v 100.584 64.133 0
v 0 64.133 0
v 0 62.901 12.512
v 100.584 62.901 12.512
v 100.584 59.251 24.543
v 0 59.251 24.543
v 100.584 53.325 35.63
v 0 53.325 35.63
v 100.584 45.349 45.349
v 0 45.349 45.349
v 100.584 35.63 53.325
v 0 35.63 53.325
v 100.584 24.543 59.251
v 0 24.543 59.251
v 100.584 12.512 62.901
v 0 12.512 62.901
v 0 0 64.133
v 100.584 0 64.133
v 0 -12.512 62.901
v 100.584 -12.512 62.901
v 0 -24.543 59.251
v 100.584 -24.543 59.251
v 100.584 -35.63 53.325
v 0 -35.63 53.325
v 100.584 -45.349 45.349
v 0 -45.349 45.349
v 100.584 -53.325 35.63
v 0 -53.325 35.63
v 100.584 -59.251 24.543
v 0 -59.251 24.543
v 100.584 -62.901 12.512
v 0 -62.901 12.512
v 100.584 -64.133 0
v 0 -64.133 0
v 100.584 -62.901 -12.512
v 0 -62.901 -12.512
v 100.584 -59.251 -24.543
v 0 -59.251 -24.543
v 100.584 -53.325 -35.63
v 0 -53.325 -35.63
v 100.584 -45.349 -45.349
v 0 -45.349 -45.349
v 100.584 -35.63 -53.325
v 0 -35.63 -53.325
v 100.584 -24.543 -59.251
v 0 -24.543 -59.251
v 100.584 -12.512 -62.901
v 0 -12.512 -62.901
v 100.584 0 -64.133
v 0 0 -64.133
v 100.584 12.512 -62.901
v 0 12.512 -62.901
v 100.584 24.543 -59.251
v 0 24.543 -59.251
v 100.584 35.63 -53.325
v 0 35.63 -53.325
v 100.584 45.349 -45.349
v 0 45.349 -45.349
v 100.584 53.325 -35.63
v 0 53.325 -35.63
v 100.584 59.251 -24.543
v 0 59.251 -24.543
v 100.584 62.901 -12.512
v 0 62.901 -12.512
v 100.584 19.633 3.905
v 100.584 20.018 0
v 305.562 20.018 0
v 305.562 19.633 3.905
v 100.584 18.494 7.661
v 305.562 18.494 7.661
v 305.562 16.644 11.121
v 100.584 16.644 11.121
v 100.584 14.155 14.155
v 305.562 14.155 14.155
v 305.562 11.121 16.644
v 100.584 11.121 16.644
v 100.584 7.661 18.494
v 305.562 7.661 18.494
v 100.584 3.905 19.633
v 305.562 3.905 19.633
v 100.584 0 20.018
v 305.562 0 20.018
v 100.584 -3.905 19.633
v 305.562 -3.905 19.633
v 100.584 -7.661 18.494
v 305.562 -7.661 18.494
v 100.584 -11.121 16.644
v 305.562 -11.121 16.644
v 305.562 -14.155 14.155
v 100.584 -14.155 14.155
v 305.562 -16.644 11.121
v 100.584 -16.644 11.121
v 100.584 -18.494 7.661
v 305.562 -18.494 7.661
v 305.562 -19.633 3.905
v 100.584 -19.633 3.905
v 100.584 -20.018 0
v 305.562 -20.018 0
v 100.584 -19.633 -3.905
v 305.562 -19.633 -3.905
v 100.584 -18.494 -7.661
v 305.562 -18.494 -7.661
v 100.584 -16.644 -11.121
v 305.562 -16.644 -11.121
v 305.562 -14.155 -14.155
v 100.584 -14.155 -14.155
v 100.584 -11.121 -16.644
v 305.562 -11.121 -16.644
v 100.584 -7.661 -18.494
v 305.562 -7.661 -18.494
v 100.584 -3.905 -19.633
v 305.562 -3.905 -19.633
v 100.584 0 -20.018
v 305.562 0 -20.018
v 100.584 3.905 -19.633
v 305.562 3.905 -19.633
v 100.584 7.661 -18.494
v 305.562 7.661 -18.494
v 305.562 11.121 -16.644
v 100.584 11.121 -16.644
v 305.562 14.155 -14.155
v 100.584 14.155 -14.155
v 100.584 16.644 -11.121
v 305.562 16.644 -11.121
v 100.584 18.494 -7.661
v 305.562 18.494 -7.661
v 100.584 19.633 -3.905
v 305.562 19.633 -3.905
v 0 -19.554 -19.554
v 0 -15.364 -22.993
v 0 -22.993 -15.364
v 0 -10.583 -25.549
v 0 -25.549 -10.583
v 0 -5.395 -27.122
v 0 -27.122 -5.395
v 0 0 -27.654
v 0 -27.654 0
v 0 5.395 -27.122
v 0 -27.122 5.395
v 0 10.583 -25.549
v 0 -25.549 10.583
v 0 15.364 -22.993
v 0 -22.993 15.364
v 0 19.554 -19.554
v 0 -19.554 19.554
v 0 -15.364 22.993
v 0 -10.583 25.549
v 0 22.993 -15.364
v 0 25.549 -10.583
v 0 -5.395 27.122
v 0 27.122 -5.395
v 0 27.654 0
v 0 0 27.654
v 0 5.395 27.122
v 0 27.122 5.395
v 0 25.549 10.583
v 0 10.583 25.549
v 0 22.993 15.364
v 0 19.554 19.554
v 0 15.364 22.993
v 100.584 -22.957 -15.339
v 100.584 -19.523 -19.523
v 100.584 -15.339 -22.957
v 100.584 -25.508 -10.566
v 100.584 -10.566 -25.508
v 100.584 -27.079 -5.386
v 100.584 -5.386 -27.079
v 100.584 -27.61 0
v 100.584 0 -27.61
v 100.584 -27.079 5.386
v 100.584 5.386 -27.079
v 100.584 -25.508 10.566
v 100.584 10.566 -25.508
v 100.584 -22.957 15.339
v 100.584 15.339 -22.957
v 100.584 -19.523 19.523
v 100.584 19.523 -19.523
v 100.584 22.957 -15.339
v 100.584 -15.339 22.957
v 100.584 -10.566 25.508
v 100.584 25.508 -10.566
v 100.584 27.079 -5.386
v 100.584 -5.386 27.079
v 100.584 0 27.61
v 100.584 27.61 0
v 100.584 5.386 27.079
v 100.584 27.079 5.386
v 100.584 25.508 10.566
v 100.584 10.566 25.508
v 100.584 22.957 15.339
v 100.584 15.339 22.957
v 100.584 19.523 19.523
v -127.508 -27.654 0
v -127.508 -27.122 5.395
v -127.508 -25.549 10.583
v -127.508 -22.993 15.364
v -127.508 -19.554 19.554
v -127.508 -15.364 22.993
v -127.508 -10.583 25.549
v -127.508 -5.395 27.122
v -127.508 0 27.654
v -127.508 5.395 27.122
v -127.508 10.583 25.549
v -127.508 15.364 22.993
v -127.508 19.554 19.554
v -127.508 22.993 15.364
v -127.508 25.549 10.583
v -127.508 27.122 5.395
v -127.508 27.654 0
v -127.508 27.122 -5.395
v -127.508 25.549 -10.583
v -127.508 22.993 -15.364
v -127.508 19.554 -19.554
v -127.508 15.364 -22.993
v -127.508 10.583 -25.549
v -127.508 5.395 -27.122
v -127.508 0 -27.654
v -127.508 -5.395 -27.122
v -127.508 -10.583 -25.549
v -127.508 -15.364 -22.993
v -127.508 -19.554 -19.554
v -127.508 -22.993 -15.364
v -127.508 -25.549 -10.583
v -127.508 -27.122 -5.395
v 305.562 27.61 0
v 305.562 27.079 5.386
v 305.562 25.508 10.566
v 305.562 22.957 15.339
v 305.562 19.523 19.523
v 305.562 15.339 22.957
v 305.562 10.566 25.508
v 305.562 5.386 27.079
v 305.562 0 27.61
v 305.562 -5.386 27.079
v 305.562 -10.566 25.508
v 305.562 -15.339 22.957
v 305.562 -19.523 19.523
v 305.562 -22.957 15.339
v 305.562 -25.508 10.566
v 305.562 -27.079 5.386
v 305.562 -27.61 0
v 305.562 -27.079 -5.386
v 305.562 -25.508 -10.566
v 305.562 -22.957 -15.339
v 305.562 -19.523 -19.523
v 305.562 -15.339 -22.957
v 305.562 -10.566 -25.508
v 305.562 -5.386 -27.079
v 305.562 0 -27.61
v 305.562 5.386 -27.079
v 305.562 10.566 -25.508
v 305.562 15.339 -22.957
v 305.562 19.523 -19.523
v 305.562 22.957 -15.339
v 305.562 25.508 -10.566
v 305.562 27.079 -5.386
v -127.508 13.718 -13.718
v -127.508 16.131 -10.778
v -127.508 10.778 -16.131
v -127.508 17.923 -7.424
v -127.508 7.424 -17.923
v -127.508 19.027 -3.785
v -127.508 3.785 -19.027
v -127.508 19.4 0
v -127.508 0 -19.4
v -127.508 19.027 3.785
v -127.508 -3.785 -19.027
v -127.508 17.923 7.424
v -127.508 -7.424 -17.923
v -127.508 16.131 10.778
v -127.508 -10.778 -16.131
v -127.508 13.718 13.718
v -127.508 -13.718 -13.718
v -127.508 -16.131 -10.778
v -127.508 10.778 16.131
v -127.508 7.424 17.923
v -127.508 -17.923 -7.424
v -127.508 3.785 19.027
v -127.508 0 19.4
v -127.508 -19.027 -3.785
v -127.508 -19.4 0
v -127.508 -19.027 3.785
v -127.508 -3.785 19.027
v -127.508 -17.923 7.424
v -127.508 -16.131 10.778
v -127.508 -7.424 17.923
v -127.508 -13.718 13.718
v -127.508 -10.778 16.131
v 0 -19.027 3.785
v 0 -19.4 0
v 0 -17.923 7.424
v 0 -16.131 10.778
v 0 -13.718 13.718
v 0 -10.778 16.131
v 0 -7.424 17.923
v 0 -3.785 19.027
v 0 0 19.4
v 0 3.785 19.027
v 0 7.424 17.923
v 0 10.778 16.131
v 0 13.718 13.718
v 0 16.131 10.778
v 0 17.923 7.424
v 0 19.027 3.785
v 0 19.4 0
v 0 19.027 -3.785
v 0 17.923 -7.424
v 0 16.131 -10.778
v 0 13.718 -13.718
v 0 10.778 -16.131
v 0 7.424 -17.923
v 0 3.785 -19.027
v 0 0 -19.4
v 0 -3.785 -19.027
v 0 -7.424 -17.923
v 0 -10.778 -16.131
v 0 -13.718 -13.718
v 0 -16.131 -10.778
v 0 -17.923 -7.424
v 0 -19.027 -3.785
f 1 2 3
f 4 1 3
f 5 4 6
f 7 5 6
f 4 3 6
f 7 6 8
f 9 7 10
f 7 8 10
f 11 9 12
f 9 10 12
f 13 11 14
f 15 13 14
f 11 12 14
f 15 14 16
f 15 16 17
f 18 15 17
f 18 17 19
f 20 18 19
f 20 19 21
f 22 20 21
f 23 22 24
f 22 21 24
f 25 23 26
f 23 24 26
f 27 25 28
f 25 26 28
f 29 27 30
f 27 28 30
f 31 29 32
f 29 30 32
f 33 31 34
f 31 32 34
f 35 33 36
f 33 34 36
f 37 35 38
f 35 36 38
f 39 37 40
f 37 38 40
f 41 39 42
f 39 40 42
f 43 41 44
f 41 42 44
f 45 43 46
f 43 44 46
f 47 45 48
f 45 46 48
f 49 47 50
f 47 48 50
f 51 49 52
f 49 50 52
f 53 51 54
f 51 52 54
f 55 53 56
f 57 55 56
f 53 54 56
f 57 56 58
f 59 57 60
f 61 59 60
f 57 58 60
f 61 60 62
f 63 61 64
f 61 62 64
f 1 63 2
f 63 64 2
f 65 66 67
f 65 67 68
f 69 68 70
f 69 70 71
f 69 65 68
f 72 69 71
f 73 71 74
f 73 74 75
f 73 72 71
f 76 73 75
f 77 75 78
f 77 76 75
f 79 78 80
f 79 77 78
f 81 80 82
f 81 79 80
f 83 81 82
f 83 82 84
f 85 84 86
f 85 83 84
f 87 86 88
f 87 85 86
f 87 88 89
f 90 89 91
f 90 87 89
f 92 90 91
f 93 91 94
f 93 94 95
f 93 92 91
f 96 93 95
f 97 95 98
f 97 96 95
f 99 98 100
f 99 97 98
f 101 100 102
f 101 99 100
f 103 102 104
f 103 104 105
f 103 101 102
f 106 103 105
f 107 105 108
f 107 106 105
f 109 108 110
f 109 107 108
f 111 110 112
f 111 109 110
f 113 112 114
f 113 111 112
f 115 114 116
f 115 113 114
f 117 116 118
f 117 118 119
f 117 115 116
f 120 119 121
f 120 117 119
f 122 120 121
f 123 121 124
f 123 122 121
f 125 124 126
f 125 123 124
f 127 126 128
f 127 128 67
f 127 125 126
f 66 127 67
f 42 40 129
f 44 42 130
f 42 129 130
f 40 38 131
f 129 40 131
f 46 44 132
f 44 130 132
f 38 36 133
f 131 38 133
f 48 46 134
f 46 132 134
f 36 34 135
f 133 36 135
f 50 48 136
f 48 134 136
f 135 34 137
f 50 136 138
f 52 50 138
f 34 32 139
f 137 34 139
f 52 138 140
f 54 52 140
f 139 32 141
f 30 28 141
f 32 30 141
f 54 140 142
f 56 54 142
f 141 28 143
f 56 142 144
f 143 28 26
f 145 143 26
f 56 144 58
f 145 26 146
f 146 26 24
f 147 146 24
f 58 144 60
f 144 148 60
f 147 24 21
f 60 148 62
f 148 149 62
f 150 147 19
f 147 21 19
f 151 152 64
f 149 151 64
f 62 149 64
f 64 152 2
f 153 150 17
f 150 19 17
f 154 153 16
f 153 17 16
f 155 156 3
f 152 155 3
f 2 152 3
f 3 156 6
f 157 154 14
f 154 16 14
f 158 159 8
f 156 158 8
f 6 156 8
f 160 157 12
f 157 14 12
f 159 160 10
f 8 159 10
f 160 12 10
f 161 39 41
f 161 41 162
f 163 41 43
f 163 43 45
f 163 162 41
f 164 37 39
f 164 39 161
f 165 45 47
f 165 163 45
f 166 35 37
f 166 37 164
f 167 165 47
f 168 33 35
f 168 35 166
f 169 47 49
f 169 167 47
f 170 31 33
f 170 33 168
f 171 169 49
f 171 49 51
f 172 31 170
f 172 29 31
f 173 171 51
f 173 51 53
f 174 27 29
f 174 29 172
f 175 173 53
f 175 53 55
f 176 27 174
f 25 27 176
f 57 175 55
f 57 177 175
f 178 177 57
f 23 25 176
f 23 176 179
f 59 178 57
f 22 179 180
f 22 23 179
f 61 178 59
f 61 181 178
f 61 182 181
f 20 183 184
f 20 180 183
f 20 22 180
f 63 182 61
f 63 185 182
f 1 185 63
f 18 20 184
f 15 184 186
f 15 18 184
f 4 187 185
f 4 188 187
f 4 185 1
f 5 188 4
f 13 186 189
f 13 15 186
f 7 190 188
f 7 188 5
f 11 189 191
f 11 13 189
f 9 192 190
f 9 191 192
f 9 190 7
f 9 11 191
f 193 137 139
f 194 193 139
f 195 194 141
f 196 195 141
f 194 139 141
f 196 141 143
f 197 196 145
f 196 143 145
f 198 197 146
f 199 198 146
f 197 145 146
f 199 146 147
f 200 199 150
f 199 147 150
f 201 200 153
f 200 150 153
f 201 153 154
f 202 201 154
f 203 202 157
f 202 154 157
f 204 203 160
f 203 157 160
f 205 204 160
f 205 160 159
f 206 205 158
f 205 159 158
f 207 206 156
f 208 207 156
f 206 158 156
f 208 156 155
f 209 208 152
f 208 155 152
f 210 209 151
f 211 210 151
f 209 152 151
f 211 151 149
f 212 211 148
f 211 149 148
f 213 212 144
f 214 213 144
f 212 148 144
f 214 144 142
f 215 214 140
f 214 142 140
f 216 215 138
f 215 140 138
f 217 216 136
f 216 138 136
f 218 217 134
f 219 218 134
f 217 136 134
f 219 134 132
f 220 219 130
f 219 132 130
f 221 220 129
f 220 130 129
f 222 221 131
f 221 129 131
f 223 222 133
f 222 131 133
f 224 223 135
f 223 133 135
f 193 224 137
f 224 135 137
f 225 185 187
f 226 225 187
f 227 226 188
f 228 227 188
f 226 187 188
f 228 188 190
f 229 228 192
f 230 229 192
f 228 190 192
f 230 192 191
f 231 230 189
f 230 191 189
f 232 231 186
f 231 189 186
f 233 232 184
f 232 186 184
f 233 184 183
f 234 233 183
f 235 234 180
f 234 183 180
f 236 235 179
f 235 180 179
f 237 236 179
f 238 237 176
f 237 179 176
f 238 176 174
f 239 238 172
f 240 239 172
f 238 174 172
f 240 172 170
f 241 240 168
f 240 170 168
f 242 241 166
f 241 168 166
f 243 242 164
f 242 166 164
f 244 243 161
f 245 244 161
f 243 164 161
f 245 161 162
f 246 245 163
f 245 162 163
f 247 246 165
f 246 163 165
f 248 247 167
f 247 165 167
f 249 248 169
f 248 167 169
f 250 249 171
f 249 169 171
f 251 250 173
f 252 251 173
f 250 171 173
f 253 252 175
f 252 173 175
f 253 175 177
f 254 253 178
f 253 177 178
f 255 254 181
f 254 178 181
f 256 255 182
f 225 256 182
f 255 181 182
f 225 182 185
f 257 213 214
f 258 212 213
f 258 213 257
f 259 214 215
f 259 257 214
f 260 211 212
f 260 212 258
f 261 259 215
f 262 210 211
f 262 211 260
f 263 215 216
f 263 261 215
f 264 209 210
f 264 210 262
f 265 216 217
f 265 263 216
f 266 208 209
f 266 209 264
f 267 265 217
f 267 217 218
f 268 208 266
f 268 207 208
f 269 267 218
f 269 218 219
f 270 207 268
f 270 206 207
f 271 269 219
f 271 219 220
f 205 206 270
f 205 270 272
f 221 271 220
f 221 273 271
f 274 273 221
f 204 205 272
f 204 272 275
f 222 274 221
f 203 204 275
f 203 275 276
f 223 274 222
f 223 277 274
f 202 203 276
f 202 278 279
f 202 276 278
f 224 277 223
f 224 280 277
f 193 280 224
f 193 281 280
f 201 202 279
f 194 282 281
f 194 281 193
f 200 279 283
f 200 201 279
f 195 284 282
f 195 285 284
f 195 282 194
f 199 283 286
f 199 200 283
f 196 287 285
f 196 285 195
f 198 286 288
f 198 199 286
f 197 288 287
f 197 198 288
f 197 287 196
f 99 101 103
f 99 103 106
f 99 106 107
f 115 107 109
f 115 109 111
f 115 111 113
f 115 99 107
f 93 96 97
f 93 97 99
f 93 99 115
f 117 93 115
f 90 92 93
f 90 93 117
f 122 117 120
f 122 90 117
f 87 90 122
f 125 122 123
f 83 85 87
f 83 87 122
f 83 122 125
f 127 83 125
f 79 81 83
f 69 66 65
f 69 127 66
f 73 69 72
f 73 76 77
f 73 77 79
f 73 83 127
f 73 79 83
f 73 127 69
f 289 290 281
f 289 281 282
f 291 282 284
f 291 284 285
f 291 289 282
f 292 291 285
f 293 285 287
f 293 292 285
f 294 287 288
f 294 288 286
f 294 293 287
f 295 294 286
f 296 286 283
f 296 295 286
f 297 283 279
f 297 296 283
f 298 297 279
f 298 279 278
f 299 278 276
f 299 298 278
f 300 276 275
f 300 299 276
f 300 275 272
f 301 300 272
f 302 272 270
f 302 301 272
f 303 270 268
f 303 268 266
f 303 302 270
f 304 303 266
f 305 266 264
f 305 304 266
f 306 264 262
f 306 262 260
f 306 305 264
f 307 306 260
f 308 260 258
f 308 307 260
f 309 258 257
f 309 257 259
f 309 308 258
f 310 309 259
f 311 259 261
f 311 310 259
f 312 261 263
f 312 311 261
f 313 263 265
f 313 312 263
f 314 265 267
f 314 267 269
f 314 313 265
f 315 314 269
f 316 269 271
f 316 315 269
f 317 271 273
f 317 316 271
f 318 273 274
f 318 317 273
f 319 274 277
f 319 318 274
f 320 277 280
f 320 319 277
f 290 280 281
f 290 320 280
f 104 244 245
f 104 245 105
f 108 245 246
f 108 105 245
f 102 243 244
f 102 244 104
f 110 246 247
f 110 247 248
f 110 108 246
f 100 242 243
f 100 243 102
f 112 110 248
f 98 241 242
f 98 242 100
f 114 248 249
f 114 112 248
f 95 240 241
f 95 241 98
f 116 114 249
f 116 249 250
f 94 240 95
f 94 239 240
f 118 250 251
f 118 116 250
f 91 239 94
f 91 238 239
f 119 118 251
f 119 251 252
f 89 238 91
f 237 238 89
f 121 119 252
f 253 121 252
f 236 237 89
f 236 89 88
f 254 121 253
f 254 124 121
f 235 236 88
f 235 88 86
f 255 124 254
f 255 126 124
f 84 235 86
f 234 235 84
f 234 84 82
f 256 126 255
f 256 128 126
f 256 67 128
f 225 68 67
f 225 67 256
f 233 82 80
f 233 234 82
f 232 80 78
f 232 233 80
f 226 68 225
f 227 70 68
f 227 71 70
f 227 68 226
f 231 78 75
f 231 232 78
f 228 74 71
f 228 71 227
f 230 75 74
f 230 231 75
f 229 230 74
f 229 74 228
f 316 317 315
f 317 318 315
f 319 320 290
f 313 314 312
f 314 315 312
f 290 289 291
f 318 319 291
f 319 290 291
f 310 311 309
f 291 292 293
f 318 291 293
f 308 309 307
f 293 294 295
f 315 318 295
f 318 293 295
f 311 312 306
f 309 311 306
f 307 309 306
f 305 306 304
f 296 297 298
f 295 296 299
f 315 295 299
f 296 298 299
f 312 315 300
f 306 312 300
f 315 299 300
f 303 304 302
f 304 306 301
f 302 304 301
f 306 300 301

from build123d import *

# Parameters (mm, degrees)
F0_R     = 64.132843
F1_DEPTH = 100.584
F2_R     = 27.60981
F2_R_2   = 20.017869
F3_DEPTH = 204.978
F4_R     = 27.653728
F4_R_2   = 19.400153
F5_DEPTH = 127.508


with BuildPart() as f1:
    # F0 (on Right) → F1 (new body)
    with BuildSketch(Plane.YZ):
        Circle(F0_R)
    extrude(amount=F1_DEPTH)

    # F2 (on face) → F3 (join)
    with BuildSketch(Plane.YZ.offset(100.584)):
        Circle(F2_R)
        Circle(F2_R_2, mode=Mode.SUBTRACT)
    extrude(amount=F3_DEPTH)

    # F4 (on face) → F5 (join)
    with BuildSketch(Plane(origin=(0, 0, 0), x_dir=(0, -1, 0), z_dir=(-1, 0, 0))):
        Circle(F4_R)
        Circle(F4_R_2, mode=Mode.SUBTRACT)
    extrude(amount=F5_DEPTH)


solid = f1.part
